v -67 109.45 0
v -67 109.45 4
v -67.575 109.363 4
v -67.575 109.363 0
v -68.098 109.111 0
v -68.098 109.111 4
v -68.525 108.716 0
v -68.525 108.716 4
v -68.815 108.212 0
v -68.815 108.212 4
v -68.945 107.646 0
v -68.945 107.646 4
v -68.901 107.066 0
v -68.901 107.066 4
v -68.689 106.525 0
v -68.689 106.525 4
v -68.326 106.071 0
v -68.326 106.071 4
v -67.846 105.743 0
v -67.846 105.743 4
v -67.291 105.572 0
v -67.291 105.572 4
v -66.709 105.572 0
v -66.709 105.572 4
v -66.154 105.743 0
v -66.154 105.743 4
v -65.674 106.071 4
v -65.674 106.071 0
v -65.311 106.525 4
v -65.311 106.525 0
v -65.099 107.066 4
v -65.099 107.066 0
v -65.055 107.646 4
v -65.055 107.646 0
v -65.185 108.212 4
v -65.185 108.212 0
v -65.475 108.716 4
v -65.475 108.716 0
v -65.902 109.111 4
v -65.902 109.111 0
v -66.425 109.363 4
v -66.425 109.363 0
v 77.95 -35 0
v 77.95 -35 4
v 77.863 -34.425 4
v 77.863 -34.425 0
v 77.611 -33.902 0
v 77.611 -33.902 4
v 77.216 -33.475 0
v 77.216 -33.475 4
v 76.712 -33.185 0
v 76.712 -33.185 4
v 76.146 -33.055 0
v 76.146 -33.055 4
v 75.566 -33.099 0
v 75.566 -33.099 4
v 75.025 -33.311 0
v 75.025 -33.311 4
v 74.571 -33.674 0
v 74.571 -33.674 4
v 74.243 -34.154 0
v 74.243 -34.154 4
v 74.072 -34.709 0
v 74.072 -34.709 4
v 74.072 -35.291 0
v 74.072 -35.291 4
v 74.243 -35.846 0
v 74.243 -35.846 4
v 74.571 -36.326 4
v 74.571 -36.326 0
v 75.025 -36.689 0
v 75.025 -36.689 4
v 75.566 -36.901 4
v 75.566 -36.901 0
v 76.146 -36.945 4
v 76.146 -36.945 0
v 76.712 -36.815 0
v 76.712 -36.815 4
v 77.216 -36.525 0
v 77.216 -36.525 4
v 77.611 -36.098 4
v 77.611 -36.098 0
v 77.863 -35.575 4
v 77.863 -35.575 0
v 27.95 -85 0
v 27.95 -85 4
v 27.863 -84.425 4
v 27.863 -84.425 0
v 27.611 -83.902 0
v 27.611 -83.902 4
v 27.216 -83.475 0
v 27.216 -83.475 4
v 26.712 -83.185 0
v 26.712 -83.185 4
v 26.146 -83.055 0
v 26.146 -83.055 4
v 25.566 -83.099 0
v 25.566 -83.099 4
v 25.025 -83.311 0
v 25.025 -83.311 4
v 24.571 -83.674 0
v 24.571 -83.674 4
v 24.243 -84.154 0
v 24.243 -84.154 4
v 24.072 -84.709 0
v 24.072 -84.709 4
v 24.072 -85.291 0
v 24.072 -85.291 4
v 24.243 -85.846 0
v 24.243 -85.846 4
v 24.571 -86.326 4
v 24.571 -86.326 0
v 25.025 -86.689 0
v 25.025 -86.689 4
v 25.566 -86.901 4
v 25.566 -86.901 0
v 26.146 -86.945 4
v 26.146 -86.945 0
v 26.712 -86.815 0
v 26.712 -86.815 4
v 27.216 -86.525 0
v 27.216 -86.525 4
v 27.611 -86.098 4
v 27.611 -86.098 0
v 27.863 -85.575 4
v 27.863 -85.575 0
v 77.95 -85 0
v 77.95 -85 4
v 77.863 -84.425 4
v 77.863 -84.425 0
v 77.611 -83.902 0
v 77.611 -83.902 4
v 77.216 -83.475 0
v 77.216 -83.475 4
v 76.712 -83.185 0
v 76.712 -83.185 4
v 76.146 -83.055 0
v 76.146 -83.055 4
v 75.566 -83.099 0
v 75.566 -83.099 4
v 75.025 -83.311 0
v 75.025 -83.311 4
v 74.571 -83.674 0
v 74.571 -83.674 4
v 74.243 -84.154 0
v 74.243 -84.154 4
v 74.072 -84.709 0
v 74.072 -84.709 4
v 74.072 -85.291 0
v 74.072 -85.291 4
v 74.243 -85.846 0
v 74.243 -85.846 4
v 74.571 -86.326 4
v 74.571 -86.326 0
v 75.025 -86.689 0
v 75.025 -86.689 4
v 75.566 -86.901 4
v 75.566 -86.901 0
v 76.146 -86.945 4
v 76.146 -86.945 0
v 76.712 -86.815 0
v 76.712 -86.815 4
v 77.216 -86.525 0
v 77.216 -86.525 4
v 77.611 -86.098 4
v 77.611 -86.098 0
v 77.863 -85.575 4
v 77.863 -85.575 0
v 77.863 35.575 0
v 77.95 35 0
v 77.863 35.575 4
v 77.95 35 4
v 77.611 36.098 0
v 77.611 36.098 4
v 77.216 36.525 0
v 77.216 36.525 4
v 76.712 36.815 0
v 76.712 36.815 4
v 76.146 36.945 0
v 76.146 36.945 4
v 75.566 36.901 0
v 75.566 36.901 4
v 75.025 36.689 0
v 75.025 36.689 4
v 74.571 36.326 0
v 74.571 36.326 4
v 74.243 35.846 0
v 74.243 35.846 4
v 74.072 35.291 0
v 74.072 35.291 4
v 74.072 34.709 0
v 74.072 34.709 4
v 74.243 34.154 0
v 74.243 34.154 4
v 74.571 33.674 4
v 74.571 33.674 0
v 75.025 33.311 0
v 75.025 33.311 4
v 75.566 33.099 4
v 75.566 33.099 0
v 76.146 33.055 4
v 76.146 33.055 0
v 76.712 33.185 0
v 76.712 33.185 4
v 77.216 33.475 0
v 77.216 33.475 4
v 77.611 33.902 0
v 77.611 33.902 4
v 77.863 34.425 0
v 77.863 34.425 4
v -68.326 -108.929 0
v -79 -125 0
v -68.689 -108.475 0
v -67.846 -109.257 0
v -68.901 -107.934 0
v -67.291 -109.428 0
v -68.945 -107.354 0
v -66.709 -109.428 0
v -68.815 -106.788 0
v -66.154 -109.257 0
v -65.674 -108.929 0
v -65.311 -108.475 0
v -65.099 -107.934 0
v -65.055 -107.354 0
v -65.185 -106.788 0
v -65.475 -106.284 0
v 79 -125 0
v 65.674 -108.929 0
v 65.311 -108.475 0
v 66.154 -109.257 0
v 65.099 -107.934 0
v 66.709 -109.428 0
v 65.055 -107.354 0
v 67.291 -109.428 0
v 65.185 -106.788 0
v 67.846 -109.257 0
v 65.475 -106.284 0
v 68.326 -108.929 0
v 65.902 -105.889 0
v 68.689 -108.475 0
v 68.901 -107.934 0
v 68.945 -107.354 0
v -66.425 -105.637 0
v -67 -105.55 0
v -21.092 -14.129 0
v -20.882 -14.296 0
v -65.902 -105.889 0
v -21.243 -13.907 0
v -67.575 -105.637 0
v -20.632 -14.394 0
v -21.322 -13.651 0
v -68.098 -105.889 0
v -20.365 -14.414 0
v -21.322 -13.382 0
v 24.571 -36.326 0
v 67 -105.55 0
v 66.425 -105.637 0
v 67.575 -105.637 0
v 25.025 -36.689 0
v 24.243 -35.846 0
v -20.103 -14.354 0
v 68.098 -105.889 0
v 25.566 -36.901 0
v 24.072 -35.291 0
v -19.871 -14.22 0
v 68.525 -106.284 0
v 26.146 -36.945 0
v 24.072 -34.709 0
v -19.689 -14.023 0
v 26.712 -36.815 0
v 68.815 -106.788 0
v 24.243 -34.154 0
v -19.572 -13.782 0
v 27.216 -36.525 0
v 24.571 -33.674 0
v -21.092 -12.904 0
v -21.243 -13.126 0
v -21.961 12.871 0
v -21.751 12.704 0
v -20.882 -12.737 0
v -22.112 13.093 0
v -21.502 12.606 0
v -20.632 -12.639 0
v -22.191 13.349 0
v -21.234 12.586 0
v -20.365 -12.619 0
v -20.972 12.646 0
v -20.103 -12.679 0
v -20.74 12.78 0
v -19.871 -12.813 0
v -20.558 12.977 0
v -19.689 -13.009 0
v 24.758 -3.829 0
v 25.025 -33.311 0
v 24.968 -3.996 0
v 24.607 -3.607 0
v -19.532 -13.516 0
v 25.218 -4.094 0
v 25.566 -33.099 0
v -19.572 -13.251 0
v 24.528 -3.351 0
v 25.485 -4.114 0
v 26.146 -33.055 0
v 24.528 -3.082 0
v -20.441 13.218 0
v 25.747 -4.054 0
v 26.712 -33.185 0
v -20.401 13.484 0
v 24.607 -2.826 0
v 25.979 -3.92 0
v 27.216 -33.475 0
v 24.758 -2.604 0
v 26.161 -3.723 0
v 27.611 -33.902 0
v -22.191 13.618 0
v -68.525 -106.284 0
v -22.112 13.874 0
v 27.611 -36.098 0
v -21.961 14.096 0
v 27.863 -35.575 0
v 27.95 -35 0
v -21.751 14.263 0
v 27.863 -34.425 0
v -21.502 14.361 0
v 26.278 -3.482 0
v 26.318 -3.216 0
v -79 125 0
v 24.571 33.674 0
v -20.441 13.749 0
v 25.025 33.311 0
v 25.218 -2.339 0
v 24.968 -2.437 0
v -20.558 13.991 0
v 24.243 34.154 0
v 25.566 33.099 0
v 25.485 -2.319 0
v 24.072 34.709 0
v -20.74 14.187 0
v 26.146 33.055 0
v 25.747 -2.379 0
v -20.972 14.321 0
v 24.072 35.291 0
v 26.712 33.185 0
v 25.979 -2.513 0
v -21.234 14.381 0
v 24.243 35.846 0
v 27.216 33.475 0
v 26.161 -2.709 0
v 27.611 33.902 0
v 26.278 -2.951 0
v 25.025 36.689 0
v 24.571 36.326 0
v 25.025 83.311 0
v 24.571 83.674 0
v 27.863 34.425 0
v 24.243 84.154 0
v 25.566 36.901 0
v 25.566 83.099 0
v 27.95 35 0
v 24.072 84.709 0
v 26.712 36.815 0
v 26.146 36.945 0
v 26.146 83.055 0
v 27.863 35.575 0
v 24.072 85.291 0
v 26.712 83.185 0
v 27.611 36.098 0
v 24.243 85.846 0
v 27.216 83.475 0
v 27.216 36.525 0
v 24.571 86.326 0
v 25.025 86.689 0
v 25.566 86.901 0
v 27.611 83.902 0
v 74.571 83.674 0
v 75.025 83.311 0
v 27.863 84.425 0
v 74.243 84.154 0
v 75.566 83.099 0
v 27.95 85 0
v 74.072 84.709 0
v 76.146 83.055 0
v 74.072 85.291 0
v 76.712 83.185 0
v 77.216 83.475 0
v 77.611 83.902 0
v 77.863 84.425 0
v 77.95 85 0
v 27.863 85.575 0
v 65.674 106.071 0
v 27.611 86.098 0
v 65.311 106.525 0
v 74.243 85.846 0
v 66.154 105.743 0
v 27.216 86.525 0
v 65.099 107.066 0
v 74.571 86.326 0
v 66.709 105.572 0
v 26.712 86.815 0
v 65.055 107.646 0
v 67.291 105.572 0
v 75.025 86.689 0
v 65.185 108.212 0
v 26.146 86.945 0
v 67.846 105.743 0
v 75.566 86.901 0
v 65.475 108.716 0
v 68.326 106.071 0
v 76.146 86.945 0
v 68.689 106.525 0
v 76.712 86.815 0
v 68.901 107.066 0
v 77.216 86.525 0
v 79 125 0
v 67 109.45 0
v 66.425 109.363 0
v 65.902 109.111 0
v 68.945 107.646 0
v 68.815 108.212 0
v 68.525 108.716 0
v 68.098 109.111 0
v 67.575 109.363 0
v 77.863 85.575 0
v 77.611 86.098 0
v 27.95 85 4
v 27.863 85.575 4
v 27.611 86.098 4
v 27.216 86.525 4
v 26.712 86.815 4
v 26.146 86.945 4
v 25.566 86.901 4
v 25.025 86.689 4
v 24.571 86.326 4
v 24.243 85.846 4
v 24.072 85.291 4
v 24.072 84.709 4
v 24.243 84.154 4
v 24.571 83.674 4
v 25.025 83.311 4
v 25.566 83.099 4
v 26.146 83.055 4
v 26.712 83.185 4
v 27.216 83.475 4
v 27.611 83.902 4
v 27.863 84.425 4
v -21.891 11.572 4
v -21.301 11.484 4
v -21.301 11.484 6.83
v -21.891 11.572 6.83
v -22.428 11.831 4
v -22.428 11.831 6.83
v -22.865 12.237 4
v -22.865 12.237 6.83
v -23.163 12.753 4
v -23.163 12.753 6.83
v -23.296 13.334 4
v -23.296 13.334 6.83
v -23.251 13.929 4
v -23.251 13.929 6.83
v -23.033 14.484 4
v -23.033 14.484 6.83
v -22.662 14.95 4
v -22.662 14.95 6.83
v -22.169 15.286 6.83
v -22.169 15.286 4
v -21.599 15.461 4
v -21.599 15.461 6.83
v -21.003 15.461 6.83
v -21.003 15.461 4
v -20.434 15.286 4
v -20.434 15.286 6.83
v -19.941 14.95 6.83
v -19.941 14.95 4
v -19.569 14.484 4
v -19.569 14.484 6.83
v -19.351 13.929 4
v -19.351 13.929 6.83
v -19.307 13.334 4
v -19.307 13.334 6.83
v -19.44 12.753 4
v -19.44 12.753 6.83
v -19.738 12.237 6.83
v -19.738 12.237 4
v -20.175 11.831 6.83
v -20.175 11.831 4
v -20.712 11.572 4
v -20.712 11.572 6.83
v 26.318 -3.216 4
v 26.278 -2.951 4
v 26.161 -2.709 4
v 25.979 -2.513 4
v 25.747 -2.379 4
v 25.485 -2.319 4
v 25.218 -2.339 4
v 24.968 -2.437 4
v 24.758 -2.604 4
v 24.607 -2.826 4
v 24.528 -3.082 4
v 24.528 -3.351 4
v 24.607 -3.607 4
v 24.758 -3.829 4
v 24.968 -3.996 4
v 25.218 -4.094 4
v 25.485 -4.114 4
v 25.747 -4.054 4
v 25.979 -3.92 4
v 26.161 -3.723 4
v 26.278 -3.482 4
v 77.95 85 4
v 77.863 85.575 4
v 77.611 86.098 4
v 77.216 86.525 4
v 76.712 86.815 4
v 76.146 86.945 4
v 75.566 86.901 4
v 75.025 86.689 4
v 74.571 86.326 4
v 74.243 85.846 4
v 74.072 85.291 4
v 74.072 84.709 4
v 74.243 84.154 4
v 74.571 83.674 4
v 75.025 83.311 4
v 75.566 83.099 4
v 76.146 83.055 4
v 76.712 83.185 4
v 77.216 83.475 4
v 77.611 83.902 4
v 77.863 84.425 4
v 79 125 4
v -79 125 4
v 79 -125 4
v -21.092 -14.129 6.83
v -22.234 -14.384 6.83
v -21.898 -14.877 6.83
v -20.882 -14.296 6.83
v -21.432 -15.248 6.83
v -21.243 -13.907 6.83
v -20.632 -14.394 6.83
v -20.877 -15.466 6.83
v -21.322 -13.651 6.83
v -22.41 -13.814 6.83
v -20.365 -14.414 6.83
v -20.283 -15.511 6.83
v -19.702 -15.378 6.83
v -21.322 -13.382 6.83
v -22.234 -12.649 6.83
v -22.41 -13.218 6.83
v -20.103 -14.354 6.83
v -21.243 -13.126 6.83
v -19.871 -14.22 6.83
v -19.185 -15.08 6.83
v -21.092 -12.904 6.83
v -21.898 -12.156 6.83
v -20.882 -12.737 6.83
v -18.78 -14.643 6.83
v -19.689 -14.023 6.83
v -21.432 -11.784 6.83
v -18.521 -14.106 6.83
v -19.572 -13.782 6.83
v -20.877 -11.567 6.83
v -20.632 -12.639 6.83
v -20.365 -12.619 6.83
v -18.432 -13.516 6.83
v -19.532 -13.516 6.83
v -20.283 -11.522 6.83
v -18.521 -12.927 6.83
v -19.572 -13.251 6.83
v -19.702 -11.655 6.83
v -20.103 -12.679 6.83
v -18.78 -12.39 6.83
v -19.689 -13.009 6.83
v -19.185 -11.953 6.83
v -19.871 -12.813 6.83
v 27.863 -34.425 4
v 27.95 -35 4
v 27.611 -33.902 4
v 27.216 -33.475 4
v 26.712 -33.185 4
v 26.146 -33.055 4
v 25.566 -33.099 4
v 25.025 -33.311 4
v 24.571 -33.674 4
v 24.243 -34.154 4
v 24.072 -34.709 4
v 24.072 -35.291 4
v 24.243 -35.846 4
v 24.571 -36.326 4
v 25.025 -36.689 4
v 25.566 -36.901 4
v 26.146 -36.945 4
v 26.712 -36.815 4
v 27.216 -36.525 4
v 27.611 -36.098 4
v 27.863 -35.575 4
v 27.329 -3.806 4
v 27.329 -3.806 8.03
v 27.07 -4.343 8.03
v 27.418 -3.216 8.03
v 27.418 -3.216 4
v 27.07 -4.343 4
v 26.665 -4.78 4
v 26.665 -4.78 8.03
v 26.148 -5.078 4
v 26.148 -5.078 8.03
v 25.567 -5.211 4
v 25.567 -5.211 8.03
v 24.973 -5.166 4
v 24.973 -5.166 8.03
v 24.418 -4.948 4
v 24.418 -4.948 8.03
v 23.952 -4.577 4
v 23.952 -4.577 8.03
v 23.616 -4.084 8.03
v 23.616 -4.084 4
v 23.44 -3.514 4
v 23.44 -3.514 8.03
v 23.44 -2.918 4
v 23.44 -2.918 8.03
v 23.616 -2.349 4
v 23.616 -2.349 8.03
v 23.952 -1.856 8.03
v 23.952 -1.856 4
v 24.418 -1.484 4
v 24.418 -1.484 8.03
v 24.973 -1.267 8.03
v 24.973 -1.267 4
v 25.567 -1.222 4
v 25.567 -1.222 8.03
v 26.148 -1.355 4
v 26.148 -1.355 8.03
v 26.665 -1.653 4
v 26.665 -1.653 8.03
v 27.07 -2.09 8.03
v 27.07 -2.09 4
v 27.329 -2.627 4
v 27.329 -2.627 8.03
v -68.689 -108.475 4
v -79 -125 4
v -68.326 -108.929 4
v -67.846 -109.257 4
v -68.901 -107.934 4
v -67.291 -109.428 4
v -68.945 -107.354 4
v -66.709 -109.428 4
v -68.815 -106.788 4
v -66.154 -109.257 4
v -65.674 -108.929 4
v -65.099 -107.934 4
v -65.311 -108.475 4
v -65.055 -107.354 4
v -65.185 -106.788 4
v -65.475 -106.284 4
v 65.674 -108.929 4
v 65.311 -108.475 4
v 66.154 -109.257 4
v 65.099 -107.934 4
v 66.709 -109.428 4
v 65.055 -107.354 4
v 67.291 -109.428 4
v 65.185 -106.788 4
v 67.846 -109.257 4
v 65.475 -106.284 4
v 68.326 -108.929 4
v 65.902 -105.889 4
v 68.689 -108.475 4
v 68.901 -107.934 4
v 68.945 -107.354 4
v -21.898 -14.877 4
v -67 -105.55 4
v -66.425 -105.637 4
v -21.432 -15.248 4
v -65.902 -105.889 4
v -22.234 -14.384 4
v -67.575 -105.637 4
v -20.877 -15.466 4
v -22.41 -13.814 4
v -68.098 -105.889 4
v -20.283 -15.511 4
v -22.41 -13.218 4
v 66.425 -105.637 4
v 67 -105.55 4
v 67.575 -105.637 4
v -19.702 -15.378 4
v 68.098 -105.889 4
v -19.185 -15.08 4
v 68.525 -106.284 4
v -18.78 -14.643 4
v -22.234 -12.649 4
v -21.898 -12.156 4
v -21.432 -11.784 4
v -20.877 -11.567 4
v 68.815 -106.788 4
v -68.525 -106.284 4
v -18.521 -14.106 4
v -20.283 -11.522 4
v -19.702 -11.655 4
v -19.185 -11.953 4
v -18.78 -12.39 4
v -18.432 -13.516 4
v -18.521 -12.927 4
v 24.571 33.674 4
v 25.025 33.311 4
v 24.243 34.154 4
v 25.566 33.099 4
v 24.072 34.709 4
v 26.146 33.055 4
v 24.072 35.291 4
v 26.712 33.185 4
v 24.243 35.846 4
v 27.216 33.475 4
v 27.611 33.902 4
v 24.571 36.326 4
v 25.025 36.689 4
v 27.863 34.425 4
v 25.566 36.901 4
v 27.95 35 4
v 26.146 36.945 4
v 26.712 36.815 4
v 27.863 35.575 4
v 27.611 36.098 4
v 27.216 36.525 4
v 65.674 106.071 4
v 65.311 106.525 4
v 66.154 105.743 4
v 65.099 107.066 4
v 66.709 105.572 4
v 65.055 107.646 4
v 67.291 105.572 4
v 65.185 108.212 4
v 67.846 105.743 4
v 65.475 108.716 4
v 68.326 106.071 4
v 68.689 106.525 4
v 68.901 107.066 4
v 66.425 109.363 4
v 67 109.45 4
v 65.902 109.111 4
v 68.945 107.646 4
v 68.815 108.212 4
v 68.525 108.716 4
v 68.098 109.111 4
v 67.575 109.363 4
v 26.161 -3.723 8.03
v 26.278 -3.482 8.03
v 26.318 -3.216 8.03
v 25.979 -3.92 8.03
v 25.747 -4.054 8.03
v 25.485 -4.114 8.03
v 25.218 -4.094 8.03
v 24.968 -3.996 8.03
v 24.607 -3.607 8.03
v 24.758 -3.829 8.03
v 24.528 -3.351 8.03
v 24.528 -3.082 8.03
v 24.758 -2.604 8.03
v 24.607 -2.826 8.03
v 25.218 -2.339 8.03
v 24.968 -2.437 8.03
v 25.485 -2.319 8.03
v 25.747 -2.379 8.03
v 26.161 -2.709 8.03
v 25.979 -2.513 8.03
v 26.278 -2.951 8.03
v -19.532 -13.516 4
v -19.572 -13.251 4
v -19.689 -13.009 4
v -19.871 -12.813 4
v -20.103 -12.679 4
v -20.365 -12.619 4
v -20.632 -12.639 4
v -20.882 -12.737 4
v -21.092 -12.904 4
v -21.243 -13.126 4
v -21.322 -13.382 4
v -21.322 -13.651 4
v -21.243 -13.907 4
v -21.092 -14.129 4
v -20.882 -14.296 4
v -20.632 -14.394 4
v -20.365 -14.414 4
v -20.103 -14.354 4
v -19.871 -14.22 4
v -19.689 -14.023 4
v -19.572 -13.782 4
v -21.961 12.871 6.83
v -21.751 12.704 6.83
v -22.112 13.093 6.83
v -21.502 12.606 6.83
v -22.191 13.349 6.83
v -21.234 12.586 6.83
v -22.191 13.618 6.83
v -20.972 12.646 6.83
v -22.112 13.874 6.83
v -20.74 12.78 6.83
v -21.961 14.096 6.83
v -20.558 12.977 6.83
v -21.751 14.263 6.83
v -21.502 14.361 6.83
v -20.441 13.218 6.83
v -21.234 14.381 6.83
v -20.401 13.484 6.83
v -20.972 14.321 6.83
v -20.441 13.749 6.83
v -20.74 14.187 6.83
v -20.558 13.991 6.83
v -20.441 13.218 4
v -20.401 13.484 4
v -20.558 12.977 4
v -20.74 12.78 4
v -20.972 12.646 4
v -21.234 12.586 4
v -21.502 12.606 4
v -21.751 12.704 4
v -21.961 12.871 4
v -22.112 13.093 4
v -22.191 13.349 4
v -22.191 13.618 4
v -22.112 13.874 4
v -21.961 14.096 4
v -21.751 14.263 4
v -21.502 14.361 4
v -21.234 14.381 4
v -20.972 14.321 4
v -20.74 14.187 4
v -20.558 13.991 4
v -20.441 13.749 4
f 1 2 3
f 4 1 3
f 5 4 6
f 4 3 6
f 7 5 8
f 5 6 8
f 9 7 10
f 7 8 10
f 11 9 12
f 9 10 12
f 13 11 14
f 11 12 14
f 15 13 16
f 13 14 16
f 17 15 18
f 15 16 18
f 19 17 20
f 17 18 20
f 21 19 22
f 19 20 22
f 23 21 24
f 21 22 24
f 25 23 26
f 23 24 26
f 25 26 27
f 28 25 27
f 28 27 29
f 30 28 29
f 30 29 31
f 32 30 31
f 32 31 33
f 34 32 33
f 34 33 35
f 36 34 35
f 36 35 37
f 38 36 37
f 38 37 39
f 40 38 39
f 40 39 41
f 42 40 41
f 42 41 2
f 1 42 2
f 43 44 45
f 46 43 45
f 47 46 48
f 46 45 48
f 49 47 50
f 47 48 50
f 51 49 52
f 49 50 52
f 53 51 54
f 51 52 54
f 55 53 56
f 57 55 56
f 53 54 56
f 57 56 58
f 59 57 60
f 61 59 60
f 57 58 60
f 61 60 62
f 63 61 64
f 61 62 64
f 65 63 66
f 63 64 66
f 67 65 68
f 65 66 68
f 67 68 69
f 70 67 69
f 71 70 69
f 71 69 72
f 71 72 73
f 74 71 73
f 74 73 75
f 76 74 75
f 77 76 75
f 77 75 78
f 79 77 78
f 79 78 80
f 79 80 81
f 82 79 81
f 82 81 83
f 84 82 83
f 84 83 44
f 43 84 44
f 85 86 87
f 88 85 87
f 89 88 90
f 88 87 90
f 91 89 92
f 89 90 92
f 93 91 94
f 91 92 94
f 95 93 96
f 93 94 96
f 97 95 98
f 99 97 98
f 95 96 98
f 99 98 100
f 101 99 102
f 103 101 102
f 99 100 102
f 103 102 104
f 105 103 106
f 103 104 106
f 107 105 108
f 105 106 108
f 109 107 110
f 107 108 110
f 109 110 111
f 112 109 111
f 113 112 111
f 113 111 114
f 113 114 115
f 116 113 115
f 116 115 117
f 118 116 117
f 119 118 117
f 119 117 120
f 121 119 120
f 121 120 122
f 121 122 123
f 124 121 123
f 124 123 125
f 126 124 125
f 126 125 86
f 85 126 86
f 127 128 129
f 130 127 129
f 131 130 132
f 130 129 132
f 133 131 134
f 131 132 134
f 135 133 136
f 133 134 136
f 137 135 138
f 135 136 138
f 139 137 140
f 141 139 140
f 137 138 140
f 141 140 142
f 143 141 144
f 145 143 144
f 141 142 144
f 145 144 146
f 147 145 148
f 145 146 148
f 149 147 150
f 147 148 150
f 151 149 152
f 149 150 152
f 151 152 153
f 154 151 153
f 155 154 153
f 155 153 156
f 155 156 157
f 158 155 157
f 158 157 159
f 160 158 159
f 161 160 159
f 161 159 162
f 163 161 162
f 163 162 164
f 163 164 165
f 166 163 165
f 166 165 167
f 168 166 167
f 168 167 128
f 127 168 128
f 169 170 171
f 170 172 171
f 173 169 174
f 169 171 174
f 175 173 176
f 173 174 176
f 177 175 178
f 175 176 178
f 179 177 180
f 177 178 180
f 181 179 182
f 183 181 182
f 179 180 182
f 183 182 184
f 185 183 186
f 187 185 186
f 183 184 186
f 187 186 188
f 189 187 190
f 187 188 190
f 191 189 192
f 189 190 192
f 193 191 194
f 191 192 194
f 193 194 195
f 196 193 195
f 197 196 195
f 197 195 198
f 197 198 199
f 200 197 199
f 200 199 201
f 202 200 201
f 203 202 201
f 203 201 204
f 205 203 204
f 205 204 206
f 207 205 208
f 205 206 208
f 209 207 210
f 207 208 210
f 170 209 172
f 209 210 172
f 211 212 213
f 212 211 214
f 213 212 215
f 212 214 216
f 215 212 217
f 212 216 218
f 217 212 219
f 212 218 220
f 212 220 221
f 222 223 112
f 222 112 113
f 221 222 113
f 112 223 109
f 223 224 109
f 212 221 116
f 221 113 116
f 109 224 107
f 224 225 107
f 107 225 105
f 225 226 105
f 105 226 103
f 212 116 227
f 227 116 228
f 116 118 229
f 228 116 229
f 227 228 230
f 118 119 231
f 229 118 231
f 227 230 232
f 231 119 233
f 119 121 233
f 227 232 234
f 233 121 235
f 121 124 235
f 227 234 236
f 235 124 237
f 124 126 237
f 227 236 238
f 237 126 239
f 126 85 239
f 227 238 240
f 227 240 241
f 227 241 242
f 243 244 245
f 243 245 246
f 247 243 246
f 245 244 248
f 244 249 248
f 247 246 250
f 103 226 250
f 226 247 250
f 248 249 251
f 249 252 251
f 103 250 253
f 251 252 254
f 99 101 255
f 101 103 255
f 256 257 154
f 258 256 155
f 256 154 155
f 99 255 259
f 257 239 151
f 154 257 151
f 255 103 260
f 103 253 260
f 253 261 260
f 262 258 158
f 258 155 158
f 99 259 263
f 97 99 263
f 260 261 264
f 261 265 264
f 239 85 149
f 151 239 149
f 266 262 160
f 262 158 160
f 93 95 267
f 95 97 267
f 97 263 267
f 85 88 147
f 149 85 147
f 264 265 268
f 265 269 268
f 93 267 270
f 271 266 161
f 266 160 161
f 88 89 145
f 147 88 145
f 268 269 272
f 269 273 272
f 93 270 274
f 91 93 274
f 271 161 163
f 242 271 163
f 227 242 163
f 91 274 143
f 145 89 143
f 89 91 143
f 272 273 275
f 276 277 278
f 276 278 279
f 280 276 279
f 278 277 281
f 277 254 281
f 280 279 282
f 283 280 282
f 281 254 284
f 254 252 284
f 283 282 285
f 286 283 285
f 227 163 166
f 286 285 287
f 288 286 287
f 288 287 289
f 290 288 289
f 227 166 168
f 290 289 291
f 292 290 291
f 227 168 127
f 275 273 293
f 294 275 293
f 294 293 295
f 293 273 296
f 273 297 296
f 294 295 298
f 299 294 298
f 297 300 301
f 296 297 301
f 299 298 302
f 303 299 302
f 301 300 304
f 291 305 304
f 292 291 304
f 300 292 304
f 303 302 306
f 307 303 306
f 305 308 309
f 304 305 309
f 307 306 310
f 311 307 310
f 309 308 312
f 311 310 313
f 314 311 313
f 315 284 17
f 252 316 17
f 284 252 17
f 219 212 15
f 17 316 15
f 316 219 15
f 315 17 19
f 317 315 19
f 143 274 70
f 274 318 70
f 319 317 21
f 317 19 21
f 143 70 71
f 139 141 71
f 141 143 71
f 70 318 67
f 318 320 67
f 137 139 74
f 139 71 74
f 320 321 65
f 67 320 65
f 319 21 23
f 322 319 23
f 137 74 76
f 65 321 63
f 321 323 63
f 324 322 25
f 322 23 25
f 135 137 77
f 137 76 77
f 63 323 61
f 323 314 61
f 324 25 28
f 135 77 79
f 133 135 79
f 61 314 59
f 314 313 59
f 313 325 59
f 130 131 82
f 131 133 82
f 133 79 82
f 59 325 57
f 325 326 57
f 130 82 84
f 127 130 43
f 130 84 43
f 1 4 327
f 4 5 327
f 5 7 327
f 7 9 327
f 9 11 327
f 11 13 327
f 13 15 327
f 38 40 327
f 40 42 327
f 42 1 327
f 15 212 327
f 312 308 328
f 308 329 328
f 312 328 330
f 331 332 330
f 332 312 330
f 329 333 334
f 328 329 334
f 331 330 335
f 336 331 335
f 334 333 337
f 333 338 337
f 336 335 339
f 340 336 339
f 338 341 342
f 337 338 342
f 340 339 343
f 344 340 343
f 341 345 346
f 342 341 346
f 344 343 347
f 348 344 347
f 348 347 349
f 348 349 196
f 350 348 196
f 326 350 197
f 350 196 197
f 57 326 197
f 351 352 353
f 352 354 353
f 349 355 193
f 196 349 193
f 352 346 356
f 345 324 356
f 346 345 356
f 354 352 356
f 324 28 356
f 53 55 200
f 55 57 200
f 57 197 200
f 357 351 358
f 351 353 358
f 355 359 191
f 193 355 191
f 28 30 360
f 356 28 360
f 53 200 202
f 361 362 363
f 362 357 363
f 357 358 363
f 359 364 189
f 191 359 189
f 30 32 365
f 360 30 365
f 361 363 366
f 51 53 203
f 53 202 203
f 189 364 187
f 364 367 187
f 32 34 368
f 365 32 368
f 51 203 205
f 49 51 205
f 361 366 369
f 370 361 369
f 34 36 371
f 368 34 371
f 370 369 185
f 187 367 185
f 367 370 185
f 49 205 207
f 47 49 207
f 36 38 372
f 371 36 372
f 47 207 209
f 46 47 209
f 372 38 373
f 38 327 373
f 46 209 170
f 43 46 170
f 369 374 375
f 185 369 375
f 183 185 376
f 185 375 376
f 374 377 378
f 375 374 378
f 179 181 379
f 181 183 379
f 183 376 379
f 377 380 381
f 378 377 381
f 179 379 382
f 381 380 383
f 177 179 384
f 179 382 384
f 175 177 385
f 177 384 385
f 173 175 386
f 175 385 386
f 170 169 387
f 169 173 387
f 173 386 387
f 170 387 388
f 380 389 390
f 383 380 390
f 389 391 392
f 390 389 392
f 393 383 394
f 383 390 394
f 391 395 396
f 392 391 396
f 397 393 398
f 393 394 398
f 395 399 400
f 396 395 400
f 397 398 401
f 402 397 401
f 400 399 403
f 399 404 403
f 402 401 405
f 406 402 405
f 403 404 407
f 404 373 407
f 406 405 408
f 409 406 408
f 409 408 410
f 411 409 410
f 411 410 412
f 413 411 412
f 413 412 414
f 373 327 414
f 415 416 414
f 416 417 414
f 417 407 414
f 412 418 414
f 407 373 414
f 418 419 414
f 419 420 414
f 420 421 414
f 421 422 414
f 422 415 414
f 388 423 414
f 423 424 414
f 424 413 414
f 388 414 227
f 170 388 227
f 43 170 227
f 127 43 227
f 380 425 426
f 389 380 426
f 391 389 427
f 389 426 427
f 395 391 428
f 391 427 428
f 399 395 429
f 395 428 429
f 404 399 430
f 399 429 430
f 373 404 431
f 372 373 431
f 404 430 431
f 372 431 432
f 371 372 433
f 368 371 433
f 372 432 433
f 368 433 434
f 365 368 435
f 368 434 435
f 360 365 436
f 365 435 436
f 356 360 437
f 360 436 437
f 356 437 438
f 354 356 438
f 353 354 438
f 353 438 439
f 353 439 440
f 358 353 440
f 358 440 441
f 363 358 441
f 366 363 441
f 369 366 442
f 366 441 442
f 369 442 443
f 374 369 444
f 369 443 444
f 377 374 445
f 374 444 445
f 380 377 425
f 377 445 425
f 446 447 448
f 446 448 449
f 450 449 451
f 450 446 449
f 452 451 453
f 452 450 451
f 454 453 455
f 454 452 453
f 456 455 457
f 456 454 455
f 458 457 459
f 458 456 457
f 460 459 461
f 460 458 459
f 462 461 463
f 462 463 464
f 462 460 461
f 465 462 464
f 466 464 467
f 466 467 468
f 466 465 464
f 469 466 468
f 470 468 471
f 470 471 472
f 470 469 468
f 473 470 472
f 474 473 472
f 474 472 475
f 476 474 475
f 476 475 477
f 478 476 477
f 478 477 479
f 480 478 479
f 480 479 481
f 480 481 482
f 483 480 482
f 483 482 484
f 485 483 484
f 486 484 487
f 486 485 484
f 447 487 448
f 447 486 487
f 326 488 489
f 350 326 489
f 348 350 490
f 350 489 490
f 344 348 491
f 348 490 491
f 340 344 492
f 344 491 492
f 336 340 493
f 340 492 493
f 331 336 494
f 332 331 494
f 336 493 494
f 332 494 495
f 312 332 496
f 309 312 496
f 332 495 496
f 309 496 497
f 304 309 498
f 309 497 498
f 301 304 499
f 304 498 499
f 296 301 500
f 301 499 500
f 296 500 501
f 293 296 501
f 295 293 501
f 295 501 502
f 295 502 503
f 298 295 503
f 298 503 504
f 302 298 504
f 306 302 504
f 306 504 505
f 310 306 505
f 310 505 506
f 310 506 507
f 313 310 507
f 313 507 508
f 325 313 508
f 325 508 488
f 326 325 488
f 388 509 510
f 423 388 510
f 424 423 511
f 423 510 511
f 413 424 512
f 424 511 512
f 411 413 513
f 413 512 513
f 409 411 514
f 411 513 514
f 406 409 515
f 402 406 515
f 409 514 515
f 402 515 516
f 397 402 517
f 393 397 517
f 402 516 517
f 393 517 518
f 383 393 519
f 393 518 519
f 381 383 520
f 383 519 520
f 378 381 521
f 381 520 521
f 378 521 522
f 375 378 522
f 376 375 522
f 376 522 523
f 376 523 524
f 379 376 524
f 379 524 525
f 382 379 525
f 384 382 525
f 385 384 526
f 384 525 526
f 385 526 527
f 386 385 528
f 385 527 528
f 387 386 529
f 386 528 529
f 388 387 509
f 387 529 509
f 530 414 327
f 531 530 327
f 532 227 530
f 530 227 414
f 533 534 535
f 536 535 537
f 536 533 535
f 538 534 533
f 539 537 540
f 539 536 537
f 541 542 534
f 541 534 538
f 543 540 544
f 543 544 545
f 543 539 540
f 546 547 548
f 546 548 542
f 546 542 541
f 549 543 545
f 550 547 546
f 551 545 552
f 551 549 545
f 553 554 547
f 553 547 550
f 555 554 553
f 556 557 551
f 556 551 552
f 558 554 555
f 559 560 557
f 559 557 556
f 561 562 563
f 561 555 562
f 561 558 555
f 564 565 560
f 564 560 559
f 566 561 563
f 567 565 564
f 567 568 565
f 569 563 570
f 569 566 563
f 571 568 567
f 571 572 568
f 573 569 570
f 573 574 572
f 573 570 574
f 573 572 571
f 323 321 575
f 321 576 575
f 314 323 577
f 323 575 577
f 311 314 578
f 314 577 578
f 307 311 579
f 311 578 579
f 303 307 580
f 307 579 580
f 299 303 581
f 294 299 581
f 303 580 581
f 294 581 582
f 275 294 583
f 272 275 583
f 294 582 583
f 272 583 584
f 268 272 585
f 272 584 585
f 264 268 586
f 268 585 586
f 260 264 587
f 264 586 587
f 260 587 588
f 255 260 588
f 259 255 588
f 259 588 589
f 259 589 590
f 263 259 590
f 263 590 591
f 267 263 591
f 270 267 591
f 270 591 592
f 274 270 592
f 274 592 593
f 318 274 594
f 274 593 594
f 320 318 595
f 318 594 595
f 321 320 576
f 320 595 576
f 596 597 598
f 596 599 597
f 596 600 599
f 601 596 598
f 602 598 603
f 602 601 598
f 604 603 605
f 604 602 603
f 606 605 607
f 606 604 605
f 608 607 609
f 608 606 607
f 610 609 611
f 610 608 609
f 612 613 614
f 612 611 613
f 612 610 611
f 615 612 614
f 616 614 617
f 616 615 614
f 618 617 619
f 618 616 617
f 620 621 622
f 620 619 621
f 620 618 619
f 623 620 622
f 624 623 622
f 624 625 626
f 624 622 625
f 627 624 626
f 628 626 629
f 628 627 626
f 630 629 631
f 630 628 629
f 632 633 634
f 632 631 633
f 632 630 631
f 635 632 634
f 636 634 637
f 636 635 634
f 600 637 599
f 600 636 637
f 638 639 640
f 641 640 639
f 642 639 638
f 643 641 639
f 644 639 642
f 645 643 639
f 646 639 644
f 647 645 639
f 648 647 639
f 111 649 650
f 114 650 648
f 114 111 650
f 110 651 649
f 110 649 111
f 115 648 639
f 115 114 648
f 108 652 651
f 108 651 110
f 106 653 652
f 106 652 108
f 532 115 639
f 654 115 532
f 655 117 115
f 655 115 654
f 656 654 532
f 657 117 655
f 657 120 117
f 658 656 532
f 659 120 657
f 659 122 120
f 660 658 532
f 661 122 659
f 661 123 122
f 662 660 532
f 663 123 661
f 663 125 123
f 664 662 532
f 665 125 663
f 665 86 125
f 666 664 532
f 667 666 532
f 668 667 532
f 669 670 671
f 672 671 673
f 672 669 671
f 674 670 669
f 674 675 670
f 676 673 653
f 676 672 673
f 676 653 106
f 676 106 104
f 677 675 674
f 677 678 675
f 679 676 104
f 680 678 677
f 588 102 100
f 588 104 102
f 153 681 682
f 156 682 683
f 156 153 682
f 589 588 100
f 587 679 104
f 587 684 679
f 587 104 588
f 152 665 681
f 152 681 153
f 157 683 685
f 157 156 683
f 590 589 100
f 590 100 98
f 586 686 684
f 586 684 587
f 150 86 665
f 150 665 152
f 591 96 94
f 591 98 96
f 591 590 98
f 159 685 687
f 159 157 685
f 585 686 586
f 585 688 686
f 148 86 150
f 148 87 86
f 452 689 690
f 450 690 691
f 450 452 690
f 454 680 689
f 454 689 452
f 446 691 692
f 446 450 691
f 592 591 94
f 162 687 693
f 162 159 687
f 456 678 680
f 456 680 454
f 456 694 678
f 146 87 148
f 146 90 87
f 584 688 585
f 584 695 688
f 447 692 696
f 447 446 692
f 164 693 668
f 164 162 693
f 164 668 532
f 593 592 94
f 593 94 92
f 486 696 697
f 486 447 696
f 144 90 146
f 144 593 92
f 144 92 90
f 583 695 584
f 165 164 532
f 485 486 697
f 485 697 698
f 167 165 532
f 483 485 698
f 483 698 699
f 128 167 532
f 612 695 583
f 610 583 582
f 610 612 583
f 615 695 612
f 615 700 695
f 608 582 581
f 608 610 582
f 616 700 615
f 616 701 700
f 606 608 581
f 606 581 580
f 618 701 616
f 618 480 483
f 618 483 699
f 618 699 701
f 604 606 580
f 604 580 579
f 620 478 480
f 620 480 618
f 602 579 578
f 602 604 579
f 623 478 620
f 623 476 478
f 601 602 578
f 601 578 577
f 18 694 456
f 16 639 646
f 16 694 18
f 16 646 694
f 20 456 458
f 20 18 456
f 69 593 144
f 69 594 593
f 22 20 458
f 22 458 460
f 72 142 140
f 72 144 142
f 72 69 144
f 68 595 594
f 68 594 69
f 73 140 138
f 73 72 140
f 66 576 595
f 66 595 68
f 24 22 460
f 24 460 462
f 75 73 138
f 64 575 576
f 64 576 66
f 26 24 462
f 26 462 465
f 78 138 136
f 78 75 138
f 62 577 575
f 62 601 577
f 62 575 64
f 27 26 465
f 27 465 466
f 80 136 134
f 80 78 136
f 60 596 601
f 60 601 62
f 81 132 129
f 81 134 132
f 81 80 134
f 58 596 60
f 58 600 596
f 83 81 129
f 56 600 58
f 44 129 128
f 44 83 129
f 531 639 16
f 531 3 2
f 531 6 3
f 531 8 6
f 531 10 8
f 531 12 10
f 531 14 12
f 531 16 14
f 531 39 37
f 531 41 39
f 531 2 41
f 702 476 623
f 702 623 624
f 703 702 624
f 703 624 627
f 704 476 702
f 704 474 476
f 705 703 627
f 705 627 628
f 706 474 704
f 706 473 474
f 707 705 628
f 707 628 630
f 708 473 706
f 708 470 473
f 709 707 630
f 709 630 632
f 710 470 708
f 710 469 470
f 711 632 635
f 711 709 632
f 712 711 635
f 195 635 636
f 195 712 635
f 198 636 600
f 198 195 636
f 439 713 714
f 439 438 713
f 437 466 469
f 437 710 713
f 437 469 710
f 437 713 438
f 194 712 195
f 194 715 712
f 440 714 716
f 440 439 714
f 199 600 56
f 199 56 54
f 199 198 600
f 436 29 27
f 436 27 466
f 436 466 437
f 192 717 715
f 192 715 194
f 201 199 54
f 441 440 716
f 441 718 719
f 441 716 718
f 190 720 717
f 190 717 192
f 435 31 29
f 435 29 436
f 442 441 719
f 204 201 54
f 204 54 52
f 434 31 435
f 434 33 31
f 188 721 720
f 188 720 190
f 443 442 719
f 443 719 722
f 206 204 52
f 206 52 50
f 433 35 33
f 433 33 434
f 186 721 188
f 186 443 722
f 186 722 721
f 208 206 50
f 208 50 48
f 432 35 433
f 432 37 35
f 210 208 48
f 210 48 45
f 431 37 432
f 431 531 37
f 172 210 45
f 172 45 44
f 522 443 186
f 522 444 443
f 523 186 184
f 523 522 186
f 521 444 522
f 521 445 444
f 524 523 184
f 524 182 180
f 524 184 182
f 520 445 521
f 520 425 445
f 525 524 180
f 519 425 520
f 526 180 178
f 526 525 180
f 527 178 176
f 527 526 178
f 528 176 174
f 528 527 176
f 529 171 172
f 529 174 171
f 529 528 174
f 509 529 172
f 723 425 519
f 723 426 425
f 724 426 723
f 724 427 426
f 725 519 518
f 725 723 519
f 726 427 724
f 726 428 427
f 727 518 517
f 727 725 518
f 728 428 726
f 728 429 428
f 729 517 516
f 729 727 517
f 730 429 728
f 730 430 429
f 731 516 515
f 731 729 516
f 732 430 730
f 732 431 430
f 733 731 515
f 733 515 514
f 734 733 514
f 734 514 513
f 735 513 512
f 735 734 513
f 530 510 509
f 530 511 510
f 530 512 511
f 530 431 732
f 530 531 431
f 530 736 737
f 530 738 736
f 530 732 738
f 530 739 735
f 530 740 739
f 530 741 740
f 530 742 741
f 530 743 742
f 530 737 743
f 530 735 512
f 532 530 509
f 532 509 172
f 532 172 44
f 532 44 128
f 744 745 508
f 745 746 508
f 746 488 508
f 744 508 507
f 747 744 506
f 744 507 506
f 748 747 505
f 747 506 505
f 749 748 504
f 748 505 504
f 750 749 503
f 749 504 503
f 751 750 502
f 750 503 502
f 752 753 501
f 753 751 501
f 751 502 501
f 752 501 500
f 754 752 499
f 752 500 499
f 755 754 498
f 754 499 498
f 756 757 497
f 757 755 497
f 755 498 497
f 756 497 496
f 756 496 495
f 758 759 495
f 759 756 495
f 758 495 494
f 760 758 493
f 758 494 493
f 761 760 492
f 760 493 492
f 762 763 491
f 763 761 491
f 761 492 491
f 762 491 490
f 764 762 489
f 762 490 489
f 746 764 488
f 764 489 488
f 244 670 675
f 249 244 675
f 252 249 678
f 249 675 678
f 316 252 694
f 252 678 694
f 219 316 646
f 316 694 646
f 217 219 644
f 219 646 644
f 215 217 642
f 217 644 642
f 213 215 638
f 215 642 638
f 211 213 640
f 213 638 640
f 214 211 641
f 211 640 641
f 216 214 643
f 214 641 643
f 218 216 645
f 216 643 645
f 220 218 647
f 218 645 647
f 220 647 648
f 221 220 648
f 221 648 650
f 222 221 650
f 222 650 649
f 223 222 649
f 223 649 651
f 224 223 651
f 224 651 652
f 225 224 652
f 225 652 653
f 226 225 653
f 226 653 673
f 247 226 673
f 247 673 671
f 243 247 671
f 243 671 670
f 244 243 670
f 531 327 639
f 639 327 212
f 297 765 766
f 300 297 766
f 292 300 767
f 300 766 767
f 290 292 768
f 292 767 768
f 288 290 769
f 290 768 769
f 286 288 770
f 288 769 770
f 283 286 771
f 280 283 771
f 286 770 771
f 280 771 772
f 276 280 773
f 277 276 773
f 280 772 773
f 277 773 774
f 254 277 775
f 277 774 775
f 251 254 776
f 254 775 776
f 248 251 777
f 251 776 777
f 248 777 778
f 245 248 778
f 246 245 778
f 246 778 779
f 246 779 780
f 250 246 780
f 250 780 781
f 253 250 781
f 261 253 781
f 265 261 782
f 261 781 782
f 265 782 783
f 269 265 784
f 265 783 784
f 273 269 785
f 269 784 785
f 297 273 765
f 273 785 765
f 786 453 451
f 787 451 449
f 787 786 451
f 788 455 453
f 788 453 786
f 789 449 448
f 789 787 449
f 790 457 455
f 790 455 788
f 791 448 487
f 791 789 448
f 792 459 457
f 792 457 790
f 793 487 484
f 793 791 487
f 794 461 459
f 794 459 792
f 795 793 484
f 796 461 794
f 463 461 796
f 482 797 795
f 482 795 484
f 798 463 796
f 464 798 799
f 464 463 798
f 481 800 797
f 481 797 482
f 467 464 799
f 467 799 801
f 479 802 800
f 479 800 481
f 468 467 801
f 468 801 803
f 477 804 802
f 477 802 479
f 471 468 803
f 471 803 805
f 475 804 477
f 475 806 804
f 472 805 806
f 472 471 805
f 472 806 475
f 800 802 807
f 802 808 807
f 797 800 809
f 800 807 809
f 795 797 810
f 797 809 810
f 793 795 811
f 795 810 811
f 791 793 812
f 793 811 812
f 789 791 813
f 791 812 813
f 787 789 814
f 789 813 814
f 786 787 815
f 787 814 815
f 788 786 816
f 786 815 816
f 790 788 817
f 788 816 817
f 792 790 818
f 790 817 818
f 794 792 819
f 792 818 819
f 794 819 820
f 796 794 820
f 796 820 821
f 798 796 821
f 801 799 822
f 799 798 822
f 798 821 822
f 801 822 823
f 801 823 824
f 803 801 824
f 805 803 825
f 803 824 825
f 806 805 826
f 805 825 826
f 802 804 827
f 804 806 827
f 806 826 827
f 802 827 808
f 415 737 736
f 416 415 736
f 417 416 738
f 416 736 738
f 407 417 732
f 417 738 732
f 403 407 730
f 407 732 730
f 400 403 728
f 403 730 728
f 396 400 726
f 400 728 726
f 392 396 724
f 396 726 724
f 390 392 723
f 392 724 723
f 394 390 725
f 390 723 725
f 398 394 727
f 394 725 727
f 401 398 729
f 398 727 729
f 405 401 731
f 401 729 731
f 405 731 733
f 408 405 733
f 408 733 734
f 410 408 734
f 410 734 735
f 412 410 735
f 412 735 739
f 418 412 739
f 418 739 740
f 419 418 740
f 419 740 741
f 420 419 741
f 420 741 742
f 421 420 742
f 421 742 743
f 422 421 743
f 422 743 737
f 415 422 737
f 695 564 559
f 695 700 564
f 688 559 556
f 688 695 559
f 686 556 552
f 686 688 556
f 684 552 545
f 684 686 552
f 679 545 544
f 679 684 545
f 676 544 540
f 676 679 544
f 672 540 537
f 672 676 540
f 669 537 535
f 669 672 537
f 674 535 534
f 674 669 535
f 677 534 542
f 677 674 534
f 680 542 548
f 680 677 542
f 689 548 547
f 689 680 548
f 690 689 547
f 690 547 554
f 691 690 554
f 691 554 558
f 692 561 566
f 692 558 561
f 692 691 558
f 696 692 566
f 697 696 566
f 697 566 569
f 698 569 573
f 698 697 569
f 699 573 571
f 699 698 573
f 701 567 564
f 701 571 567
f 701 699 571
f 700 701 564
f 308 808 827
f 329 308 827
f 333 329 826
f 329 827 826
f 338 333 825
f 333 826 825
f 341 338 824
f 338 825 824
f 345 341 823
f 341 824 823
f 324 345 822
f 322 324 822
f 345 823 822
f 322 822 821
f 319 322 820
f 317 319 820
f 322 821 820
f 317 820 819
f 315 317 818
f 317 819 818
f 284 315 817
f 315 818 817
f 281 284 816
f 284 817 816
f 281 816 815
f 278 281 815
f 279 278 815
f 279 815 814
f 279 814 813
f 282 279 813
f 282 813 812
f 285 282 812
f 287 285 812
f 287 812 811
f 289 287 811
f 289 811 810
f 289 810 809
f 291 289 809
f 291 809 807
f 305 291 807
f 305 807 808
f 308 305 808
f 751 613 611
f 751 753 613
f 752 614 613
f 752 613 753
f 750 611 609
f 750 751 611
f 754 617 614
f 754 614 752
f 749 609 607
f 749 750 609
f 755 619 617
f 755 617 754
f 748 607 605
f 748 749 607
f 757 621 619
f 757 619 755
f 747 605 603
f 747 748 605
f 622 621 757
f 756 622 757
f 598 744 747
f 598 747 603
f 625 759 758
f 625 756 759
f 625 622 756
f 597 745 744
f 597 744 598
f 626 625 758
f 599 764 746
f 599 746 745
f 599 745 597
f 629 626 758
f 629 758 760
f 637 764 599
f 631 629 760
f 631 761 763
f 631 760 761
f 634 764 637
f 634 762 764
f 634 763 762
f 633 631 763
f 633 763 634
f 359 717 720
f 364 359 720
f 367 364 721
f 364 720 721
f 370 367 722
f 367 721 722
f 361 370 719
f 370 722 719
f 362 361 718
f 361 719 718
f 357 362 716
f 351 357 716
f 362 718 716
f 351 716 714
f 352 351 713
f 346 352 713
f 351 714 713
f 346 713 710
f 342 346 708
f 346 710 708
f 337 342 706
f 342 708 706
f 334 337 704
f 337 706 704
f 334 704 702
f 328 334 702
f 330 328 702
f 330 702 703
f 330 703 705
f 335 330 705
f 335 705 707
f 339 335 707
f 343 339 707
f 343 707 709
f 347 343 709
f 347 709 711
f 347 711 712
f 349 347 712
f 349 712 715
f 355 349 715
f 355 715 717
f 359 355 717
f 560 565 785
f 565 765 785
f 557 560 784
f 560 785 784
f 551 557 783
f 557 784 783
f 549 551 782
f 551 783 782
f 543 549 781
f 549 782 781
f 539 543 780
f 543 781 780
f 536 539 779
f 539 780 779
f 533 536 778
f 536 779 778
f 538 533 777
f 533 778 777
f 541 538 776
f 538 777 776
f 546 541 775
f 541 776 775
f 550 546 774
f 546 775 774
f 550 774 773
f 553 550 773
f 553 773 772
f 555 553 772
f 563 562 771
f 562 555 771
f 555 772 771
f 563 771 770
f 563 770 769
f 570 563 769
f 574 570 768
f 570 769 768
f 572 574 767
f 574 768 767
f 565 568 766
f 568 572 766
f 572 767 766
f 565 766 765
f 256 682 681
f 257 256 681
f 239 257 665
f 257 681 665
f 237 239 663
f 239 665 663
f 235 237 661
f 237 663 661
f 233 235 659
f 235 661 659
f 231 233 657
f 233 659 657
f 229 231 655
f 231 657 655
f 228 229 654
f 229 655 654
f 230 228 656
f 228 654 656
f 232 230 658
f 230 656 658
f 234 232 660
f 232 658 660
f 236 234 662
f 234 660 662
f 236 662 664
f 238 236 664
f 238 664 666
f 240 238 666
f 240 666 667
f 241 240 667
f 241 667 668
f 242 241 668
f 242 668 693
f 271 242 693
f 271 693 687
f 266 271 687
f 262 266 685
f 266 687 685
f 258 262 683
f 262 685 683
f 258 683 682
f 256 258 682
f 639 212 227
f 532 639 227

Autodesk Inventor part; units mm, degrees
ref_plane "YZ Plane" through (0, 0, 0) normal (1, 0, 0) x (0, 1, 0)
ref_plane "XZ Plane" through (0, 0, 0) normal (0, 1, 0) x (-1, 0, 0)
ref_plane "Work Plane1" through (0, 0, 0) normal (0, 0, 1) x (1, 0, 0)
sketch "Sketch1" plane through (0, 0, 0) normal (0, 0, 1) x (1, 0, 0)
  arc A0 (80, 65) -> (65, 80) centre (65, 65) ccw projected
  line L0 (80, 65) -> (80, -65) projected
  arc A1 (65, -80) -> (80, -65) centre (65, -65) ccw projected
  line L1 (65, -80) -> (-65, -80) projected
  arc A2 (-80, -65) -> (-65, -80) centre (-65, -65) ccw projected
  line L2 (-80, -65) -> (-80, 65) projected
  arc A3 (-65, 80) -> (-80, 65) centre (-65, 65) ccw projected
  line L3 (-65, 80) -> (65, 80) projected
  line L4 (-150, -150) -> (150, -150) projected
  line L5 (150, -150) -> (150, 150) projected
  line L6 (150, 150) -> (-150, 150) projected
  line L7 (-150, 150) -> (-150, -150) projected
  line L8 (79, -65) -> (79, 65)
  arc A4 (79, 65) -> (65, 79) centre (65, 65) ccw
  line L9 (65, 79) -> (-65, 79)
  arc A5 (-65, 79) -> (-79, 65) centre (-65, 65) ccw
  line L10 (-79, 65) -> (-79, -65)
  arc A6 (-79, -65) -> (-65, -79) centre (-65, -65) ccw
  line L11 (-65, -79) -> (65, -79)
  arc A7 (65, -79) -> (79, -65) centre (65, -65) ccw
  circle A8 centre (-67, -107.5) radius 1.95 projected
  circle A9 centre (67, 107.5) radius 1.95 projected
  circle A10 centre (-67, 107.5) radius 1.95 projected
  circle A11 centre (67, -107.5) radius 1.95 projected
  point P0 (0, 0)
  dimension "d0" = 1
ref_plane "Work Plane3" through (0, 0, 0) normal (0, 0, 1) x (1, 0, 0)
sketch "Sketch2" plane through (0, 0, 0) normal (0, 0, 1) x (1, 0, 0)
  line L0 (79, -65) -> (79, 65) projected
  arc A0 (79, 65) -> (65, 79) centre (65, 65) ccw projected
  line L1 (65, 79) -> (-65, 79) projected
  arc A1 (-65, 79) -> (-79, 65) centre (-65, 65) ccw projected
  line L2 (-79, 65) -> (-79, -65) projected
  arc A2 (-79, -65) -> (-65, -79) centre (-65, -65) ccw projected
  line L3 (-65, -79) -> (65, -79) projected
  arc A3 (65, -79) -> (79, -65) centre (65, -65) ccw projected
  line L4 (-79, -125) -> (79, -125)
  line L5 (79, -125) -> (79, 125)
  line L6 (79, 125) -> (-79, 125)
  line L7 (-79, 125) -> (-79, -125)
  line L8 (-79, -125) -> (79, 125) construction
  line L9 (79, -125) -> (-79, 125) construction
  point P0 (0, 0)
  dimension "d3" = 250
extrude "Extrusion2" add sketch "Sketch2" along normal blind 4
ref_plane "Work Plane2" through (-26.5401, 7.7836, 6.83) normal (0, 0, -1) x (0, 1, 0)
sketch "Sketch3" plane through (0, 0, 4) normal (0, 0, 1) x (1, 0, 0)
  arc A0 (-22.3322, 15.5836) -> (-25.0072, 11.4836) centre (-3.6319, 0.4603) ccw
  line L0 (-21.3013, 11.4836) -> (-25.0072, 11.4836)
  arc A1 (-21.3013, 11.4836) -> (-20.1013, 15.0836) centre (-21.3013, 13.4836) ccw
  line L1 (-20.1013, 15.5836) -> (-20.1013, 15.0836)
  line L2 (-22.3322, 15.5836) -> (-20.1013, 15.5836)
  circle A2 centre (-21.3013, 13.4836) radius 0.9
  circle A3 centre (6.0928, 10.7836) radius 1.575
  circle A4 centre (6.0928, 10.7836) radius 0.7
  circle A5 centre (4.2678, -11.3664) radius 1.575
  circle A6 centre (4.2678, -11.3664) radius 0.7
  circle A7 centre (-21.3013, 13.4836) radius 0.9
  circle A8 centre (-21.3013, 13.4836) radius 2
  circle A9 centre (25.4178, -3.2164) radius 0.9
  circle A10 centre (-20.4322, -13.5164) radius 0.9
  circle A11 centre (-20.4322, -13.5164) radius 2
  circle A12 centre (25.4178, -3.2164) radius 2
  point P0 (0, 0)
extrude "Extrusion3" add sketch "Sketch3" along normal up to surface (2.83 mm away) contours A8 A1 | A11 | A12
sketch "Sketch4" plane through (25.4178, -3.2164, 6.83) normal (0, 0, 1) x (1, 0, 0)
  circle A0 centre (0, 0) radius 2 projected
  circle A1 centre (0, 0) radius 0.9 projected
  point P0 (-25.4178, 3.2164)
extrude "Extrusion4" add sketch "Sketch4" along normal up to surface (1.2 mm away)
sketch "Sketch5" plane through (0, 0, 4) normal (0, 0, 1) x (1, 0, 0)
  circle A0 centre (-20.4322, -13.5164) radius 2 projected
  circle A1 centre (-20.4322, -13.5164) radius 0.9 projected
  circle A2 centre (-21.3013, 13.4836) radius 0.9 projected
  circle A3 centre (25.4178, -3.2164) radius 0.9 projected
  point P0 (0, 0)
extrude "Extrusion5" cut sketch "Sketch5" against normal through all contours A1 | A2 | A3
sketch "Sketch6" plane through (0, 0, 4) normal (0, 0, 1) x (1, 0, 0)
  circle A0 centre (76, -85) radius 1.95 projected
  circle A1 centre (26, -85) radius 1.95 projected
  circle A2 centre (26, -35) radius 1.95 projected
  circle A3 centre (76, -35) radius 1.95 projected
  circle A4 centre (76, 35) radius 1.95 projected
  circle A5 centre (26, 35) radius 1.95 projected
  circle A6 centre (76, 85) radius 1.95 projected
  circle A7 centre (26, 85) radius 1.95 projected
  point P0 (0, 0)
extrude "Extrusion6" cut sketch "Sketch6" against normal through all
sketch "Sketch7" plane through (0, 0, 0) normal (0, 0, -1) x (-1, 0, 0)
  circle A0 centre (-76, 85) radius 1.95 projected
  circle A1 centre (-76, 35) radius 1.95 projected
  circle A2 centre (-26, -35) radius 1.95 projected
  circle A3 centre (-76, -85) radius 1.95 projected
  circle A4 centre (-26, -85) radius 1.95 projected
  circle A5 centre (-76, -35) radius 1.95 projected
  circle A6 centre (-26, 35) radius 1.95 projected
  circle A7 centre (-26, 85) radius 1.95 projected
  line L0 (79, -125) -> (-79, -125) projected
  line L1 (79, 125) -> (79, -125) projected
  line L2 (-79, 125) -> (79, 125) projected
  line L3 (-79, -125) -> (-79, 125) projected
  line L4 (67, -107.5) -> (-67, -107.5)
  line L5 (-67, -107.5) -> (-67, 107.5)
  line L6 (-67, 107.5) -> (67, 107.5)
  line L7 (67, 107.5) -> (67, -107.5)
  line L8 (67, -107.5) -> (-67, 107.5) construction
  line L9 (-67, -107.5) -> (67, 107.5) construction
  point P0 (0, 0)
  dimension "d16" = 134
  dimension "d17" = 215
hole "Hole1" at (-67, 107.5, 0) at (67, 107.5, 0) at (67, -107.5, 0) at (-67, -107.5, 0) direction (0, 0, 1) diameter 3.9 depth 10 tip angle 118
properties part number "01_Zeiss_Axiotech_adapterplate"
